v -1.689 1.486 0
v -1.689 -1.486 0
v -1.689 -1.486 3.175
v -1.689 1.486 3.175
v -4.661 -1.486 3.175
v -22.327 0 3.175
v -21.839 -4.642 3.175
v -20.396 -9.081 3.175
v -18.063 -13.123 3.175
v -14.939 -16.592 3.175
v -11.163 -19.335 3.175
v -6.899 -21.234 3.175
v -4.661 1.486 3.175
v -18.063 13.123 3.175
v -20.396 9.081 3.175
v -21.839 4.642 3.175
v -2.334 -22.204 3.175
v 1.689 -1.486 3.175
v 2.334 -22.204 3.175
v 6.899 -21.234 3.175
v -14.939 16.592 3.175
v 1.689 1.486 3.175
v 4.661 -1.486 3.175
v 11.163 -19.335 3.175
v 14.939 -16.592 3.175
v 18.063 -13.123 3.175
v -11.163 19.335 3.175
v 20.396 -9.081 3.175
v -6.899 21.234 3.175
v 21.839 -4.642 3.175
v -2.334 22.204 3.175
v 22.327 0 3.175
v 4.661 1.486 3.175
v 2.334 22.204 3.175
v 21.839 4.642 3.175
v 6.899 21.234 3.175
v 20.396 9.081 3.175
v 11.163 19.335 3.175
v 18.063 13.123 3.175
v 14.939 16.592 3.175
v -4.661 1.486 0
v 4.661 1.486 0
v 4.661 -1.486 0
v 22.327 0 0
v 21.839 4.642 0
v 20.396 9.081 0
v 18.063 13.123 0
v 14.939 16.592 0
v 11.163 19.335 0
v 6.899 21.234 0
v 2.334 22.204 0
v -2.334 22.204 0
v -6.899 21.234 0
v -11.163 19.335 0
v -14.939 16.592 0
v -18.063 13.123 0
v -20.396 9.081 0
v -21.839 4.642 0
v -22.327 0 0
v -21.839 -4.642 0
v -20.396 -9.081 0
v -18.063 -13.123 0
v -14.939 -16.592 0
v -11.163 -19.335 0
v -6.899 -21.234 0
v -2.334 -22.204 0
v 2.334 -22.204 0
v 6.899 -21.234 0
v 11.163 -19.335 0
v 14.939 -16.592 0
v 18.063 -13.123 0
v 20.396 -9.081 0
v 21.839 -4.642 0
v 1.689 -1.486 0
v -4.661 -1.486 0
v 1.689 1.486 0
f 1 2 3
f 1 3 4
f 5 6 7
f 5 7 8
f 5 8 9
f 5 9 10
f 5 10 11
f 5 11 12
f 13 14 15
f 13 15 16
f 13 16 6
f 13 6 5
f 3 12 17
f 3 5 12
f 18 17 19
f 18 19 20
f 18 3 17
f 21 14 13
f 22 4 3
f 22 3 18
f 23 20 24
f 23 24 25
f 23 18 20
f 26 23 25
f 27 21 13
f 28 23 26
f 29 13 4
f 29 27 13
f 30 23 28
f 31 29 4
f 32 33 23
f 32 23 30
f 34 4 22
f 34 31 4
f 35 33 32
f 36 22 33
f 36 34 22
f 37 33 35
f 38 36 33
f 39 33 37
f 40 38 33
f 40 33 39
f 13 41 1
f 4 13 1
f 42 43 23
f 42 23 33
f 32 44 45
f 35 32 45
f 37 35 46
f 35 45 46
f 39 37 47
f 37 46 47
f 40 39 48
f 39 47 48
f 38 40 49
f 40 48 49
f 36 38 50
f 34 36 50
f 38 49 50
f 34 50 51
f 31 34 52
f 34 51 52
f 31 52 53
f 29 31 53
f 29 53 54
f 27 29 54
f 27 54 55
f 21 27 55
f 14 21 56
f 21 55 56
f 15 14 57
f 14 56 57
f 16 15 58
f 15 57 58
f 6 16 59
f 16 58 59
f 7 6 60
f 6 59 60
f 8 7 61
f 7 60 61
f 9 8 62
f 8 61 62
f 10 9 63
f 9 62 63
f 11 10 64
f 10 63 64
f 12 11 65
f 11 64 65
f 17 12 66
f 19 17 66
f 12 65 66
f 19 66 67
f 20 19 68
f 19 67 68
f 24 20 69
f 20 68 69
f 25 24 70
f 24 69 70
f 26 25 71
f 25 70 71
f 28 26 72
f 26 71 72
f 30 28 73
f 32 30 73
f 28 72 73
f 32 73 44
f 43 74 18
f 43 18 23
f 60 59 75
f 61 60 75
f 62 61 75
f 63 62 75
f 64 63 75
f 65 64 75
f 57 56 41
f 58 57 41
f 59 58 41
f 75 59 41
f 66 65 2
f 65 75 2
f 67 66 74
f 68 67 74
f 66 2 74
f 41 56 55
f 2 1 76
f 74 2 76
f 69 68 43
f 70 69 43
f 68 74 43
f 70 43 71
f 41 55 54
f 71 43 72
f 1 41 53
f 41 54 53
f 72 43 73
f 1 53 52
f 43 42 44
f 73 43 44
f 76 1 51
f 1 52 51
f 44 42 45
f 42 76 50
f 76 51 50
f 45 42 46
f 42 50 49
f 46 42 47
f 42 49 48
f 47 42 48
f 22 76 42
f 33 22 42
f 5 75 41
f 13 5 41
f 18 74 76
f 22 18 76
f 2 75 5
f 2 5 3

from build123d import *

# Parameters (mm, degrees)
SKETCH1_R           = 22.3266
SKETCH1_W           = 2.9718
SKETCH1_H           = 2.9718
BOSS_EXTRUDE1_DEPTH = 3.175


with BuildPart() as part:
    # Sketch1 → Boss-Extrude1 (new body)
    with BuildSketch(Plane.XY):
        Circle(SKETCH1_R)
        with Locations((-3.175, 0)):
            Rectangle(SKETCH1_W, SKETCH1_H, mode=Mode.SUBTRACT)
        with Locations((3.175, 0)):
            Rectangle(SKETCH1_W, SKETCH1_H, mode=Mode.SUBTRACT)
    extrude(amount=BOSS_EXTRUDE1_DEPTH)


solid = part.part
